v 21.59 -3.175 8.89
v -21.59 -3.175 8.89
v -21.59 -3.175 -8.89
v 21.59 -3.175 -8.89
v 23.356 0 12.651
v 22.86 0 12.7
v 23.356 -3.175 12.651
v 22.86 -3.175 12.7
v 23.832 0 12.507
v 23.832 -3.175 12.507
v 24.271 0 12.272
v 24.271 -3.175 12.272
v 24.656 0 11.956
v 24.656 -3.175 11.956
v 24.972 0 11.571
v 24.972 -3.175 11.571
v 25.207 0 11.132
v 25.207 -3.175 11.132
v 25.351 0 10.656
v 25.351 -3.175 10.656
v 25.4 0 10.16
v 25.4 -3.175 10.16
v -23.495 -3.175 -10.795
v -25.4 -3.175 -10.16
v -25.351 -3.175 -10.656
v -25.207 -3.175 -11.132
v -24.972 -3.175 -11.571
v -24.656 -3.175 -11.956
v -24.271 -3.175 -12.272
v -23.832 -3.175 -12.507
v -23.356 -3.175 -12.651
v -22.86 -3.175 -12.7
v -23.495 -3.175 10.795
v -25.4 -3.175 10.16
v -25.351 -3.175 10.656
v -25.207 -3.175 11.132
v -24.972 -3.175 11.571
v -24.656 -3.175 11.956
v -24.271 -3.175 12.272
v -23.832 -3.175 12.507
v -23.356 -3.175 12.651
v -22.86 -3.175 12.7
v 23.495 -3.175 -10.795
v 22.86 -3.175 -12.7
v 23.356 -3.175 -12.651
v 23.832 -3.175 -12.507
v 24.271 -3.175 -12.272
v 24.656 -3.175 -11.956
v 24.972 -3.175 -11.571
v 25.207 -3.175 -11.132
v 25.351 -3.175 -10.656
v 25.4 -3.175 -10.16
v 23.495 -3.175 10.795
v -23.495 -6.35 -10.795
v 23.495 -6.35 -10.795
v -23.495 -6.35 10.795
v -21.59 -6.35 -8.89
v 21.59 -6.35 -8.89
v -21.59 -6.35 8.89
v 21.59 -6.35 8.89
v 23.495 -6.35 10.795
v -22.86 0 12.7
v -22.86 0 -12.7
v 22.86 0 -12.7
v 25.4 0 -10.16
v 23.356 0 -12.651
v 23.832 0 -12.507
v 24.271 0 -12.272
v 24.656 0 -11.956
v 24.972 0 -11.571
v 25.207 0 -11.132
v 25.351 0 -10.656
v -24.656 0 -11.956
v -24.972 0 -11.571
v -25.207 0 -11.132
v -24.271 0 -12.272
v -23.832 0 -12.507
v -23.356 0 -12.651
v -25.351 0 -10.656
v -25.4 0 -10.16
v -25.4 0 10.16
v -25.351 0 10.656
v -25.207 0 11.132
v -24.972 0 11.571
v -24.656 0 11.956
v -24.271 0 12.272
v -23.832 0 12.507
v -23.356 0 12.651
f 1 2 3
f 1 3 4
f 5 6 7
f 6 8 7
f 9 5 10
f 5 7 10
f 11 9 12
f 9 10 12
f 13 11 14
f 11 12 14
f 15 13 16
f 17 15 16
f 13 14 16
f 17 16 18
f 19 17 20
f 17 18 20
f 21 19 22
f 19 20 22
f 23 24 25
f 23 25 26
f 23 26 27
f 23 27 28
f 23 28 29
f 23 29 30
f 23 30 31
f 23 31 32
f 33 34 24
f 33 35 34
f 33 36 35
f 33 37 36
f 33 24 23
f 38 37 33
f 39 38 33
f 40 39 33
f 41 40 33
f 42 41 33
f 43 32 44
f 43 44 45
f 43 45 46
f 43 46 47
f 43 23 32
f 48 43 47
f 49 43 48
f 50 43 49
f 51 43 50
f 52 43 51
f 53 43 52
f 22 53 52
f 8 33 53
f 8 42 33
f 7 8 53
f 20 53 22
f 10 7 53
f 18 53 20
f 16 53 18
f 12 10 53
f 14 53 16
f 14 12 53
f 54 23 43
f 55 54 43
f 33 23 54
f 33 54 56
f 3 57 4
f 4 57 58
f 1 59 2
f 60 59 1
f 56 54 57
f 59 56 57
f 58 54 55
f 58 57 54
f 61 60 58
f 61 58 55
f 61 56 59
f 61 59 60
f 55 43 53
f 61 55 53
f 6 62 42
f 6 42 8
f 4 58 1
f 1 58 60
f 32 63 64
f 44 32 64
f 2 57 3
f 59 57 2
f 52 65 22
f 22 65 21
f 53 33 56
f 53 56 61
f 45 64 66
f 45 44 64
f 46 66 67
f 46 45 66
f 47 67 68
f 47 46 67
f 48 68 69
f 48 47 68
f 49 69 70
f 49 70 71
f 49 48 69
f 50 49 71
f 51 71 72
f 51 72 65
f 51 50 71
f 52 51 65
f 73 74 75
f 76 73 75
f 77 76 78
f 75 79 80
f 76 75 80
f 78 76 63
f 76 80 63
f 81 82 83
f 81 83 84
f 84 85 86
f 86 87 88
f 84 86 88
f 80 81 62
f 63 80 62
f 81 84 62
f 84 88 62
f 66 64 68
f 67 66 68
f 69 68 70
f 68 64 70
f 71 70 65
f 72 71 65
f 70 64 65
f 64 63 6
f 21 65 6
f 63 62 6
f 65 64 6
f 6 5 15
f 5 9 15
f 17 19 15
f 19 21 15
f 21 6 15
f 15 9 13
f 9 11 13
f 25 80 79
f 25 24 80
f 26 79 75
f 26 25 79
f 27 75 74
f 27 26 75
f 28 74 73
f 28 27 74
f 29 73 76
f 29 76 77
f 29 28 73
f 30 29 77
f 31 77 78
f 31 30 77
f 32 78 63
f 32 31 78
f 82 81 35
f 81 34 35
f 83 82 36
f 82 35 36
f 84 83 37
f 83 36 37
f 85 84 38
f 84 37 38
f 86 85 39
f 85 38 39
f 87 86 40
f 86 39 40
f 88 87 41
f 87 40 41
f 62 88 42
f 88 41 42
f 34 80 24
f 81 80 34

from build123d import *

# Parameters (mm, degrees)
F0_W     = 50.8
F0_H     = 25.4
F0_W_2   = 47.625
F0_H_2   = 22.225
F1_DEPTH = 3.175
F2_W     = 46.99
F2_H     = 21.59
F3_DEPTH = 3.175
F4_W     = 43.18
F4_H     = 17.78
F5_DEPTH = 3.175
F6_R     = 2.54


with BuildPart() as f1:
    # F0 (on Front) → F1 (new body)
    with BuildSketch(Plane.XZ):
        Rectangle(F0_W, F0_H)
        Rectangle(F0_W_2, F0_H_2, mode=Mode.SUBTRACT)
        Rectangle(F0_W_2, F0_H_2)
    extrude(amount=F1_DEPTH)

    # F2 (on face) → F3 (join)
    with BuildSketch(Plane.XZ.offset(3.175)):
        Rectangle(F2_W, F2_H)
    extrude(amount=F3_DEPTH)

    # F4 (on face) → F5 (cut)
    with BuildSketch(Plane.XZ.offset(6.35)):
        Rectangle(F4_W, F4_H)
    extrude(amount=-F5_DEPTH, mode=Mode.SUBTRACT)

    # F6
    f6_edges = [f1.edges().sort_by_distance(p)[0] for p in [
        (-25.4, -1.5875, -12.7),
        (25.4, -1.5875, -12.7),
        (25.4, -1.5875, 12.7),
        (-25.4, -1.5875, 12.7),
    ]]
    fillet(f6_edges, radius=F6_R)


solid = f1.part
